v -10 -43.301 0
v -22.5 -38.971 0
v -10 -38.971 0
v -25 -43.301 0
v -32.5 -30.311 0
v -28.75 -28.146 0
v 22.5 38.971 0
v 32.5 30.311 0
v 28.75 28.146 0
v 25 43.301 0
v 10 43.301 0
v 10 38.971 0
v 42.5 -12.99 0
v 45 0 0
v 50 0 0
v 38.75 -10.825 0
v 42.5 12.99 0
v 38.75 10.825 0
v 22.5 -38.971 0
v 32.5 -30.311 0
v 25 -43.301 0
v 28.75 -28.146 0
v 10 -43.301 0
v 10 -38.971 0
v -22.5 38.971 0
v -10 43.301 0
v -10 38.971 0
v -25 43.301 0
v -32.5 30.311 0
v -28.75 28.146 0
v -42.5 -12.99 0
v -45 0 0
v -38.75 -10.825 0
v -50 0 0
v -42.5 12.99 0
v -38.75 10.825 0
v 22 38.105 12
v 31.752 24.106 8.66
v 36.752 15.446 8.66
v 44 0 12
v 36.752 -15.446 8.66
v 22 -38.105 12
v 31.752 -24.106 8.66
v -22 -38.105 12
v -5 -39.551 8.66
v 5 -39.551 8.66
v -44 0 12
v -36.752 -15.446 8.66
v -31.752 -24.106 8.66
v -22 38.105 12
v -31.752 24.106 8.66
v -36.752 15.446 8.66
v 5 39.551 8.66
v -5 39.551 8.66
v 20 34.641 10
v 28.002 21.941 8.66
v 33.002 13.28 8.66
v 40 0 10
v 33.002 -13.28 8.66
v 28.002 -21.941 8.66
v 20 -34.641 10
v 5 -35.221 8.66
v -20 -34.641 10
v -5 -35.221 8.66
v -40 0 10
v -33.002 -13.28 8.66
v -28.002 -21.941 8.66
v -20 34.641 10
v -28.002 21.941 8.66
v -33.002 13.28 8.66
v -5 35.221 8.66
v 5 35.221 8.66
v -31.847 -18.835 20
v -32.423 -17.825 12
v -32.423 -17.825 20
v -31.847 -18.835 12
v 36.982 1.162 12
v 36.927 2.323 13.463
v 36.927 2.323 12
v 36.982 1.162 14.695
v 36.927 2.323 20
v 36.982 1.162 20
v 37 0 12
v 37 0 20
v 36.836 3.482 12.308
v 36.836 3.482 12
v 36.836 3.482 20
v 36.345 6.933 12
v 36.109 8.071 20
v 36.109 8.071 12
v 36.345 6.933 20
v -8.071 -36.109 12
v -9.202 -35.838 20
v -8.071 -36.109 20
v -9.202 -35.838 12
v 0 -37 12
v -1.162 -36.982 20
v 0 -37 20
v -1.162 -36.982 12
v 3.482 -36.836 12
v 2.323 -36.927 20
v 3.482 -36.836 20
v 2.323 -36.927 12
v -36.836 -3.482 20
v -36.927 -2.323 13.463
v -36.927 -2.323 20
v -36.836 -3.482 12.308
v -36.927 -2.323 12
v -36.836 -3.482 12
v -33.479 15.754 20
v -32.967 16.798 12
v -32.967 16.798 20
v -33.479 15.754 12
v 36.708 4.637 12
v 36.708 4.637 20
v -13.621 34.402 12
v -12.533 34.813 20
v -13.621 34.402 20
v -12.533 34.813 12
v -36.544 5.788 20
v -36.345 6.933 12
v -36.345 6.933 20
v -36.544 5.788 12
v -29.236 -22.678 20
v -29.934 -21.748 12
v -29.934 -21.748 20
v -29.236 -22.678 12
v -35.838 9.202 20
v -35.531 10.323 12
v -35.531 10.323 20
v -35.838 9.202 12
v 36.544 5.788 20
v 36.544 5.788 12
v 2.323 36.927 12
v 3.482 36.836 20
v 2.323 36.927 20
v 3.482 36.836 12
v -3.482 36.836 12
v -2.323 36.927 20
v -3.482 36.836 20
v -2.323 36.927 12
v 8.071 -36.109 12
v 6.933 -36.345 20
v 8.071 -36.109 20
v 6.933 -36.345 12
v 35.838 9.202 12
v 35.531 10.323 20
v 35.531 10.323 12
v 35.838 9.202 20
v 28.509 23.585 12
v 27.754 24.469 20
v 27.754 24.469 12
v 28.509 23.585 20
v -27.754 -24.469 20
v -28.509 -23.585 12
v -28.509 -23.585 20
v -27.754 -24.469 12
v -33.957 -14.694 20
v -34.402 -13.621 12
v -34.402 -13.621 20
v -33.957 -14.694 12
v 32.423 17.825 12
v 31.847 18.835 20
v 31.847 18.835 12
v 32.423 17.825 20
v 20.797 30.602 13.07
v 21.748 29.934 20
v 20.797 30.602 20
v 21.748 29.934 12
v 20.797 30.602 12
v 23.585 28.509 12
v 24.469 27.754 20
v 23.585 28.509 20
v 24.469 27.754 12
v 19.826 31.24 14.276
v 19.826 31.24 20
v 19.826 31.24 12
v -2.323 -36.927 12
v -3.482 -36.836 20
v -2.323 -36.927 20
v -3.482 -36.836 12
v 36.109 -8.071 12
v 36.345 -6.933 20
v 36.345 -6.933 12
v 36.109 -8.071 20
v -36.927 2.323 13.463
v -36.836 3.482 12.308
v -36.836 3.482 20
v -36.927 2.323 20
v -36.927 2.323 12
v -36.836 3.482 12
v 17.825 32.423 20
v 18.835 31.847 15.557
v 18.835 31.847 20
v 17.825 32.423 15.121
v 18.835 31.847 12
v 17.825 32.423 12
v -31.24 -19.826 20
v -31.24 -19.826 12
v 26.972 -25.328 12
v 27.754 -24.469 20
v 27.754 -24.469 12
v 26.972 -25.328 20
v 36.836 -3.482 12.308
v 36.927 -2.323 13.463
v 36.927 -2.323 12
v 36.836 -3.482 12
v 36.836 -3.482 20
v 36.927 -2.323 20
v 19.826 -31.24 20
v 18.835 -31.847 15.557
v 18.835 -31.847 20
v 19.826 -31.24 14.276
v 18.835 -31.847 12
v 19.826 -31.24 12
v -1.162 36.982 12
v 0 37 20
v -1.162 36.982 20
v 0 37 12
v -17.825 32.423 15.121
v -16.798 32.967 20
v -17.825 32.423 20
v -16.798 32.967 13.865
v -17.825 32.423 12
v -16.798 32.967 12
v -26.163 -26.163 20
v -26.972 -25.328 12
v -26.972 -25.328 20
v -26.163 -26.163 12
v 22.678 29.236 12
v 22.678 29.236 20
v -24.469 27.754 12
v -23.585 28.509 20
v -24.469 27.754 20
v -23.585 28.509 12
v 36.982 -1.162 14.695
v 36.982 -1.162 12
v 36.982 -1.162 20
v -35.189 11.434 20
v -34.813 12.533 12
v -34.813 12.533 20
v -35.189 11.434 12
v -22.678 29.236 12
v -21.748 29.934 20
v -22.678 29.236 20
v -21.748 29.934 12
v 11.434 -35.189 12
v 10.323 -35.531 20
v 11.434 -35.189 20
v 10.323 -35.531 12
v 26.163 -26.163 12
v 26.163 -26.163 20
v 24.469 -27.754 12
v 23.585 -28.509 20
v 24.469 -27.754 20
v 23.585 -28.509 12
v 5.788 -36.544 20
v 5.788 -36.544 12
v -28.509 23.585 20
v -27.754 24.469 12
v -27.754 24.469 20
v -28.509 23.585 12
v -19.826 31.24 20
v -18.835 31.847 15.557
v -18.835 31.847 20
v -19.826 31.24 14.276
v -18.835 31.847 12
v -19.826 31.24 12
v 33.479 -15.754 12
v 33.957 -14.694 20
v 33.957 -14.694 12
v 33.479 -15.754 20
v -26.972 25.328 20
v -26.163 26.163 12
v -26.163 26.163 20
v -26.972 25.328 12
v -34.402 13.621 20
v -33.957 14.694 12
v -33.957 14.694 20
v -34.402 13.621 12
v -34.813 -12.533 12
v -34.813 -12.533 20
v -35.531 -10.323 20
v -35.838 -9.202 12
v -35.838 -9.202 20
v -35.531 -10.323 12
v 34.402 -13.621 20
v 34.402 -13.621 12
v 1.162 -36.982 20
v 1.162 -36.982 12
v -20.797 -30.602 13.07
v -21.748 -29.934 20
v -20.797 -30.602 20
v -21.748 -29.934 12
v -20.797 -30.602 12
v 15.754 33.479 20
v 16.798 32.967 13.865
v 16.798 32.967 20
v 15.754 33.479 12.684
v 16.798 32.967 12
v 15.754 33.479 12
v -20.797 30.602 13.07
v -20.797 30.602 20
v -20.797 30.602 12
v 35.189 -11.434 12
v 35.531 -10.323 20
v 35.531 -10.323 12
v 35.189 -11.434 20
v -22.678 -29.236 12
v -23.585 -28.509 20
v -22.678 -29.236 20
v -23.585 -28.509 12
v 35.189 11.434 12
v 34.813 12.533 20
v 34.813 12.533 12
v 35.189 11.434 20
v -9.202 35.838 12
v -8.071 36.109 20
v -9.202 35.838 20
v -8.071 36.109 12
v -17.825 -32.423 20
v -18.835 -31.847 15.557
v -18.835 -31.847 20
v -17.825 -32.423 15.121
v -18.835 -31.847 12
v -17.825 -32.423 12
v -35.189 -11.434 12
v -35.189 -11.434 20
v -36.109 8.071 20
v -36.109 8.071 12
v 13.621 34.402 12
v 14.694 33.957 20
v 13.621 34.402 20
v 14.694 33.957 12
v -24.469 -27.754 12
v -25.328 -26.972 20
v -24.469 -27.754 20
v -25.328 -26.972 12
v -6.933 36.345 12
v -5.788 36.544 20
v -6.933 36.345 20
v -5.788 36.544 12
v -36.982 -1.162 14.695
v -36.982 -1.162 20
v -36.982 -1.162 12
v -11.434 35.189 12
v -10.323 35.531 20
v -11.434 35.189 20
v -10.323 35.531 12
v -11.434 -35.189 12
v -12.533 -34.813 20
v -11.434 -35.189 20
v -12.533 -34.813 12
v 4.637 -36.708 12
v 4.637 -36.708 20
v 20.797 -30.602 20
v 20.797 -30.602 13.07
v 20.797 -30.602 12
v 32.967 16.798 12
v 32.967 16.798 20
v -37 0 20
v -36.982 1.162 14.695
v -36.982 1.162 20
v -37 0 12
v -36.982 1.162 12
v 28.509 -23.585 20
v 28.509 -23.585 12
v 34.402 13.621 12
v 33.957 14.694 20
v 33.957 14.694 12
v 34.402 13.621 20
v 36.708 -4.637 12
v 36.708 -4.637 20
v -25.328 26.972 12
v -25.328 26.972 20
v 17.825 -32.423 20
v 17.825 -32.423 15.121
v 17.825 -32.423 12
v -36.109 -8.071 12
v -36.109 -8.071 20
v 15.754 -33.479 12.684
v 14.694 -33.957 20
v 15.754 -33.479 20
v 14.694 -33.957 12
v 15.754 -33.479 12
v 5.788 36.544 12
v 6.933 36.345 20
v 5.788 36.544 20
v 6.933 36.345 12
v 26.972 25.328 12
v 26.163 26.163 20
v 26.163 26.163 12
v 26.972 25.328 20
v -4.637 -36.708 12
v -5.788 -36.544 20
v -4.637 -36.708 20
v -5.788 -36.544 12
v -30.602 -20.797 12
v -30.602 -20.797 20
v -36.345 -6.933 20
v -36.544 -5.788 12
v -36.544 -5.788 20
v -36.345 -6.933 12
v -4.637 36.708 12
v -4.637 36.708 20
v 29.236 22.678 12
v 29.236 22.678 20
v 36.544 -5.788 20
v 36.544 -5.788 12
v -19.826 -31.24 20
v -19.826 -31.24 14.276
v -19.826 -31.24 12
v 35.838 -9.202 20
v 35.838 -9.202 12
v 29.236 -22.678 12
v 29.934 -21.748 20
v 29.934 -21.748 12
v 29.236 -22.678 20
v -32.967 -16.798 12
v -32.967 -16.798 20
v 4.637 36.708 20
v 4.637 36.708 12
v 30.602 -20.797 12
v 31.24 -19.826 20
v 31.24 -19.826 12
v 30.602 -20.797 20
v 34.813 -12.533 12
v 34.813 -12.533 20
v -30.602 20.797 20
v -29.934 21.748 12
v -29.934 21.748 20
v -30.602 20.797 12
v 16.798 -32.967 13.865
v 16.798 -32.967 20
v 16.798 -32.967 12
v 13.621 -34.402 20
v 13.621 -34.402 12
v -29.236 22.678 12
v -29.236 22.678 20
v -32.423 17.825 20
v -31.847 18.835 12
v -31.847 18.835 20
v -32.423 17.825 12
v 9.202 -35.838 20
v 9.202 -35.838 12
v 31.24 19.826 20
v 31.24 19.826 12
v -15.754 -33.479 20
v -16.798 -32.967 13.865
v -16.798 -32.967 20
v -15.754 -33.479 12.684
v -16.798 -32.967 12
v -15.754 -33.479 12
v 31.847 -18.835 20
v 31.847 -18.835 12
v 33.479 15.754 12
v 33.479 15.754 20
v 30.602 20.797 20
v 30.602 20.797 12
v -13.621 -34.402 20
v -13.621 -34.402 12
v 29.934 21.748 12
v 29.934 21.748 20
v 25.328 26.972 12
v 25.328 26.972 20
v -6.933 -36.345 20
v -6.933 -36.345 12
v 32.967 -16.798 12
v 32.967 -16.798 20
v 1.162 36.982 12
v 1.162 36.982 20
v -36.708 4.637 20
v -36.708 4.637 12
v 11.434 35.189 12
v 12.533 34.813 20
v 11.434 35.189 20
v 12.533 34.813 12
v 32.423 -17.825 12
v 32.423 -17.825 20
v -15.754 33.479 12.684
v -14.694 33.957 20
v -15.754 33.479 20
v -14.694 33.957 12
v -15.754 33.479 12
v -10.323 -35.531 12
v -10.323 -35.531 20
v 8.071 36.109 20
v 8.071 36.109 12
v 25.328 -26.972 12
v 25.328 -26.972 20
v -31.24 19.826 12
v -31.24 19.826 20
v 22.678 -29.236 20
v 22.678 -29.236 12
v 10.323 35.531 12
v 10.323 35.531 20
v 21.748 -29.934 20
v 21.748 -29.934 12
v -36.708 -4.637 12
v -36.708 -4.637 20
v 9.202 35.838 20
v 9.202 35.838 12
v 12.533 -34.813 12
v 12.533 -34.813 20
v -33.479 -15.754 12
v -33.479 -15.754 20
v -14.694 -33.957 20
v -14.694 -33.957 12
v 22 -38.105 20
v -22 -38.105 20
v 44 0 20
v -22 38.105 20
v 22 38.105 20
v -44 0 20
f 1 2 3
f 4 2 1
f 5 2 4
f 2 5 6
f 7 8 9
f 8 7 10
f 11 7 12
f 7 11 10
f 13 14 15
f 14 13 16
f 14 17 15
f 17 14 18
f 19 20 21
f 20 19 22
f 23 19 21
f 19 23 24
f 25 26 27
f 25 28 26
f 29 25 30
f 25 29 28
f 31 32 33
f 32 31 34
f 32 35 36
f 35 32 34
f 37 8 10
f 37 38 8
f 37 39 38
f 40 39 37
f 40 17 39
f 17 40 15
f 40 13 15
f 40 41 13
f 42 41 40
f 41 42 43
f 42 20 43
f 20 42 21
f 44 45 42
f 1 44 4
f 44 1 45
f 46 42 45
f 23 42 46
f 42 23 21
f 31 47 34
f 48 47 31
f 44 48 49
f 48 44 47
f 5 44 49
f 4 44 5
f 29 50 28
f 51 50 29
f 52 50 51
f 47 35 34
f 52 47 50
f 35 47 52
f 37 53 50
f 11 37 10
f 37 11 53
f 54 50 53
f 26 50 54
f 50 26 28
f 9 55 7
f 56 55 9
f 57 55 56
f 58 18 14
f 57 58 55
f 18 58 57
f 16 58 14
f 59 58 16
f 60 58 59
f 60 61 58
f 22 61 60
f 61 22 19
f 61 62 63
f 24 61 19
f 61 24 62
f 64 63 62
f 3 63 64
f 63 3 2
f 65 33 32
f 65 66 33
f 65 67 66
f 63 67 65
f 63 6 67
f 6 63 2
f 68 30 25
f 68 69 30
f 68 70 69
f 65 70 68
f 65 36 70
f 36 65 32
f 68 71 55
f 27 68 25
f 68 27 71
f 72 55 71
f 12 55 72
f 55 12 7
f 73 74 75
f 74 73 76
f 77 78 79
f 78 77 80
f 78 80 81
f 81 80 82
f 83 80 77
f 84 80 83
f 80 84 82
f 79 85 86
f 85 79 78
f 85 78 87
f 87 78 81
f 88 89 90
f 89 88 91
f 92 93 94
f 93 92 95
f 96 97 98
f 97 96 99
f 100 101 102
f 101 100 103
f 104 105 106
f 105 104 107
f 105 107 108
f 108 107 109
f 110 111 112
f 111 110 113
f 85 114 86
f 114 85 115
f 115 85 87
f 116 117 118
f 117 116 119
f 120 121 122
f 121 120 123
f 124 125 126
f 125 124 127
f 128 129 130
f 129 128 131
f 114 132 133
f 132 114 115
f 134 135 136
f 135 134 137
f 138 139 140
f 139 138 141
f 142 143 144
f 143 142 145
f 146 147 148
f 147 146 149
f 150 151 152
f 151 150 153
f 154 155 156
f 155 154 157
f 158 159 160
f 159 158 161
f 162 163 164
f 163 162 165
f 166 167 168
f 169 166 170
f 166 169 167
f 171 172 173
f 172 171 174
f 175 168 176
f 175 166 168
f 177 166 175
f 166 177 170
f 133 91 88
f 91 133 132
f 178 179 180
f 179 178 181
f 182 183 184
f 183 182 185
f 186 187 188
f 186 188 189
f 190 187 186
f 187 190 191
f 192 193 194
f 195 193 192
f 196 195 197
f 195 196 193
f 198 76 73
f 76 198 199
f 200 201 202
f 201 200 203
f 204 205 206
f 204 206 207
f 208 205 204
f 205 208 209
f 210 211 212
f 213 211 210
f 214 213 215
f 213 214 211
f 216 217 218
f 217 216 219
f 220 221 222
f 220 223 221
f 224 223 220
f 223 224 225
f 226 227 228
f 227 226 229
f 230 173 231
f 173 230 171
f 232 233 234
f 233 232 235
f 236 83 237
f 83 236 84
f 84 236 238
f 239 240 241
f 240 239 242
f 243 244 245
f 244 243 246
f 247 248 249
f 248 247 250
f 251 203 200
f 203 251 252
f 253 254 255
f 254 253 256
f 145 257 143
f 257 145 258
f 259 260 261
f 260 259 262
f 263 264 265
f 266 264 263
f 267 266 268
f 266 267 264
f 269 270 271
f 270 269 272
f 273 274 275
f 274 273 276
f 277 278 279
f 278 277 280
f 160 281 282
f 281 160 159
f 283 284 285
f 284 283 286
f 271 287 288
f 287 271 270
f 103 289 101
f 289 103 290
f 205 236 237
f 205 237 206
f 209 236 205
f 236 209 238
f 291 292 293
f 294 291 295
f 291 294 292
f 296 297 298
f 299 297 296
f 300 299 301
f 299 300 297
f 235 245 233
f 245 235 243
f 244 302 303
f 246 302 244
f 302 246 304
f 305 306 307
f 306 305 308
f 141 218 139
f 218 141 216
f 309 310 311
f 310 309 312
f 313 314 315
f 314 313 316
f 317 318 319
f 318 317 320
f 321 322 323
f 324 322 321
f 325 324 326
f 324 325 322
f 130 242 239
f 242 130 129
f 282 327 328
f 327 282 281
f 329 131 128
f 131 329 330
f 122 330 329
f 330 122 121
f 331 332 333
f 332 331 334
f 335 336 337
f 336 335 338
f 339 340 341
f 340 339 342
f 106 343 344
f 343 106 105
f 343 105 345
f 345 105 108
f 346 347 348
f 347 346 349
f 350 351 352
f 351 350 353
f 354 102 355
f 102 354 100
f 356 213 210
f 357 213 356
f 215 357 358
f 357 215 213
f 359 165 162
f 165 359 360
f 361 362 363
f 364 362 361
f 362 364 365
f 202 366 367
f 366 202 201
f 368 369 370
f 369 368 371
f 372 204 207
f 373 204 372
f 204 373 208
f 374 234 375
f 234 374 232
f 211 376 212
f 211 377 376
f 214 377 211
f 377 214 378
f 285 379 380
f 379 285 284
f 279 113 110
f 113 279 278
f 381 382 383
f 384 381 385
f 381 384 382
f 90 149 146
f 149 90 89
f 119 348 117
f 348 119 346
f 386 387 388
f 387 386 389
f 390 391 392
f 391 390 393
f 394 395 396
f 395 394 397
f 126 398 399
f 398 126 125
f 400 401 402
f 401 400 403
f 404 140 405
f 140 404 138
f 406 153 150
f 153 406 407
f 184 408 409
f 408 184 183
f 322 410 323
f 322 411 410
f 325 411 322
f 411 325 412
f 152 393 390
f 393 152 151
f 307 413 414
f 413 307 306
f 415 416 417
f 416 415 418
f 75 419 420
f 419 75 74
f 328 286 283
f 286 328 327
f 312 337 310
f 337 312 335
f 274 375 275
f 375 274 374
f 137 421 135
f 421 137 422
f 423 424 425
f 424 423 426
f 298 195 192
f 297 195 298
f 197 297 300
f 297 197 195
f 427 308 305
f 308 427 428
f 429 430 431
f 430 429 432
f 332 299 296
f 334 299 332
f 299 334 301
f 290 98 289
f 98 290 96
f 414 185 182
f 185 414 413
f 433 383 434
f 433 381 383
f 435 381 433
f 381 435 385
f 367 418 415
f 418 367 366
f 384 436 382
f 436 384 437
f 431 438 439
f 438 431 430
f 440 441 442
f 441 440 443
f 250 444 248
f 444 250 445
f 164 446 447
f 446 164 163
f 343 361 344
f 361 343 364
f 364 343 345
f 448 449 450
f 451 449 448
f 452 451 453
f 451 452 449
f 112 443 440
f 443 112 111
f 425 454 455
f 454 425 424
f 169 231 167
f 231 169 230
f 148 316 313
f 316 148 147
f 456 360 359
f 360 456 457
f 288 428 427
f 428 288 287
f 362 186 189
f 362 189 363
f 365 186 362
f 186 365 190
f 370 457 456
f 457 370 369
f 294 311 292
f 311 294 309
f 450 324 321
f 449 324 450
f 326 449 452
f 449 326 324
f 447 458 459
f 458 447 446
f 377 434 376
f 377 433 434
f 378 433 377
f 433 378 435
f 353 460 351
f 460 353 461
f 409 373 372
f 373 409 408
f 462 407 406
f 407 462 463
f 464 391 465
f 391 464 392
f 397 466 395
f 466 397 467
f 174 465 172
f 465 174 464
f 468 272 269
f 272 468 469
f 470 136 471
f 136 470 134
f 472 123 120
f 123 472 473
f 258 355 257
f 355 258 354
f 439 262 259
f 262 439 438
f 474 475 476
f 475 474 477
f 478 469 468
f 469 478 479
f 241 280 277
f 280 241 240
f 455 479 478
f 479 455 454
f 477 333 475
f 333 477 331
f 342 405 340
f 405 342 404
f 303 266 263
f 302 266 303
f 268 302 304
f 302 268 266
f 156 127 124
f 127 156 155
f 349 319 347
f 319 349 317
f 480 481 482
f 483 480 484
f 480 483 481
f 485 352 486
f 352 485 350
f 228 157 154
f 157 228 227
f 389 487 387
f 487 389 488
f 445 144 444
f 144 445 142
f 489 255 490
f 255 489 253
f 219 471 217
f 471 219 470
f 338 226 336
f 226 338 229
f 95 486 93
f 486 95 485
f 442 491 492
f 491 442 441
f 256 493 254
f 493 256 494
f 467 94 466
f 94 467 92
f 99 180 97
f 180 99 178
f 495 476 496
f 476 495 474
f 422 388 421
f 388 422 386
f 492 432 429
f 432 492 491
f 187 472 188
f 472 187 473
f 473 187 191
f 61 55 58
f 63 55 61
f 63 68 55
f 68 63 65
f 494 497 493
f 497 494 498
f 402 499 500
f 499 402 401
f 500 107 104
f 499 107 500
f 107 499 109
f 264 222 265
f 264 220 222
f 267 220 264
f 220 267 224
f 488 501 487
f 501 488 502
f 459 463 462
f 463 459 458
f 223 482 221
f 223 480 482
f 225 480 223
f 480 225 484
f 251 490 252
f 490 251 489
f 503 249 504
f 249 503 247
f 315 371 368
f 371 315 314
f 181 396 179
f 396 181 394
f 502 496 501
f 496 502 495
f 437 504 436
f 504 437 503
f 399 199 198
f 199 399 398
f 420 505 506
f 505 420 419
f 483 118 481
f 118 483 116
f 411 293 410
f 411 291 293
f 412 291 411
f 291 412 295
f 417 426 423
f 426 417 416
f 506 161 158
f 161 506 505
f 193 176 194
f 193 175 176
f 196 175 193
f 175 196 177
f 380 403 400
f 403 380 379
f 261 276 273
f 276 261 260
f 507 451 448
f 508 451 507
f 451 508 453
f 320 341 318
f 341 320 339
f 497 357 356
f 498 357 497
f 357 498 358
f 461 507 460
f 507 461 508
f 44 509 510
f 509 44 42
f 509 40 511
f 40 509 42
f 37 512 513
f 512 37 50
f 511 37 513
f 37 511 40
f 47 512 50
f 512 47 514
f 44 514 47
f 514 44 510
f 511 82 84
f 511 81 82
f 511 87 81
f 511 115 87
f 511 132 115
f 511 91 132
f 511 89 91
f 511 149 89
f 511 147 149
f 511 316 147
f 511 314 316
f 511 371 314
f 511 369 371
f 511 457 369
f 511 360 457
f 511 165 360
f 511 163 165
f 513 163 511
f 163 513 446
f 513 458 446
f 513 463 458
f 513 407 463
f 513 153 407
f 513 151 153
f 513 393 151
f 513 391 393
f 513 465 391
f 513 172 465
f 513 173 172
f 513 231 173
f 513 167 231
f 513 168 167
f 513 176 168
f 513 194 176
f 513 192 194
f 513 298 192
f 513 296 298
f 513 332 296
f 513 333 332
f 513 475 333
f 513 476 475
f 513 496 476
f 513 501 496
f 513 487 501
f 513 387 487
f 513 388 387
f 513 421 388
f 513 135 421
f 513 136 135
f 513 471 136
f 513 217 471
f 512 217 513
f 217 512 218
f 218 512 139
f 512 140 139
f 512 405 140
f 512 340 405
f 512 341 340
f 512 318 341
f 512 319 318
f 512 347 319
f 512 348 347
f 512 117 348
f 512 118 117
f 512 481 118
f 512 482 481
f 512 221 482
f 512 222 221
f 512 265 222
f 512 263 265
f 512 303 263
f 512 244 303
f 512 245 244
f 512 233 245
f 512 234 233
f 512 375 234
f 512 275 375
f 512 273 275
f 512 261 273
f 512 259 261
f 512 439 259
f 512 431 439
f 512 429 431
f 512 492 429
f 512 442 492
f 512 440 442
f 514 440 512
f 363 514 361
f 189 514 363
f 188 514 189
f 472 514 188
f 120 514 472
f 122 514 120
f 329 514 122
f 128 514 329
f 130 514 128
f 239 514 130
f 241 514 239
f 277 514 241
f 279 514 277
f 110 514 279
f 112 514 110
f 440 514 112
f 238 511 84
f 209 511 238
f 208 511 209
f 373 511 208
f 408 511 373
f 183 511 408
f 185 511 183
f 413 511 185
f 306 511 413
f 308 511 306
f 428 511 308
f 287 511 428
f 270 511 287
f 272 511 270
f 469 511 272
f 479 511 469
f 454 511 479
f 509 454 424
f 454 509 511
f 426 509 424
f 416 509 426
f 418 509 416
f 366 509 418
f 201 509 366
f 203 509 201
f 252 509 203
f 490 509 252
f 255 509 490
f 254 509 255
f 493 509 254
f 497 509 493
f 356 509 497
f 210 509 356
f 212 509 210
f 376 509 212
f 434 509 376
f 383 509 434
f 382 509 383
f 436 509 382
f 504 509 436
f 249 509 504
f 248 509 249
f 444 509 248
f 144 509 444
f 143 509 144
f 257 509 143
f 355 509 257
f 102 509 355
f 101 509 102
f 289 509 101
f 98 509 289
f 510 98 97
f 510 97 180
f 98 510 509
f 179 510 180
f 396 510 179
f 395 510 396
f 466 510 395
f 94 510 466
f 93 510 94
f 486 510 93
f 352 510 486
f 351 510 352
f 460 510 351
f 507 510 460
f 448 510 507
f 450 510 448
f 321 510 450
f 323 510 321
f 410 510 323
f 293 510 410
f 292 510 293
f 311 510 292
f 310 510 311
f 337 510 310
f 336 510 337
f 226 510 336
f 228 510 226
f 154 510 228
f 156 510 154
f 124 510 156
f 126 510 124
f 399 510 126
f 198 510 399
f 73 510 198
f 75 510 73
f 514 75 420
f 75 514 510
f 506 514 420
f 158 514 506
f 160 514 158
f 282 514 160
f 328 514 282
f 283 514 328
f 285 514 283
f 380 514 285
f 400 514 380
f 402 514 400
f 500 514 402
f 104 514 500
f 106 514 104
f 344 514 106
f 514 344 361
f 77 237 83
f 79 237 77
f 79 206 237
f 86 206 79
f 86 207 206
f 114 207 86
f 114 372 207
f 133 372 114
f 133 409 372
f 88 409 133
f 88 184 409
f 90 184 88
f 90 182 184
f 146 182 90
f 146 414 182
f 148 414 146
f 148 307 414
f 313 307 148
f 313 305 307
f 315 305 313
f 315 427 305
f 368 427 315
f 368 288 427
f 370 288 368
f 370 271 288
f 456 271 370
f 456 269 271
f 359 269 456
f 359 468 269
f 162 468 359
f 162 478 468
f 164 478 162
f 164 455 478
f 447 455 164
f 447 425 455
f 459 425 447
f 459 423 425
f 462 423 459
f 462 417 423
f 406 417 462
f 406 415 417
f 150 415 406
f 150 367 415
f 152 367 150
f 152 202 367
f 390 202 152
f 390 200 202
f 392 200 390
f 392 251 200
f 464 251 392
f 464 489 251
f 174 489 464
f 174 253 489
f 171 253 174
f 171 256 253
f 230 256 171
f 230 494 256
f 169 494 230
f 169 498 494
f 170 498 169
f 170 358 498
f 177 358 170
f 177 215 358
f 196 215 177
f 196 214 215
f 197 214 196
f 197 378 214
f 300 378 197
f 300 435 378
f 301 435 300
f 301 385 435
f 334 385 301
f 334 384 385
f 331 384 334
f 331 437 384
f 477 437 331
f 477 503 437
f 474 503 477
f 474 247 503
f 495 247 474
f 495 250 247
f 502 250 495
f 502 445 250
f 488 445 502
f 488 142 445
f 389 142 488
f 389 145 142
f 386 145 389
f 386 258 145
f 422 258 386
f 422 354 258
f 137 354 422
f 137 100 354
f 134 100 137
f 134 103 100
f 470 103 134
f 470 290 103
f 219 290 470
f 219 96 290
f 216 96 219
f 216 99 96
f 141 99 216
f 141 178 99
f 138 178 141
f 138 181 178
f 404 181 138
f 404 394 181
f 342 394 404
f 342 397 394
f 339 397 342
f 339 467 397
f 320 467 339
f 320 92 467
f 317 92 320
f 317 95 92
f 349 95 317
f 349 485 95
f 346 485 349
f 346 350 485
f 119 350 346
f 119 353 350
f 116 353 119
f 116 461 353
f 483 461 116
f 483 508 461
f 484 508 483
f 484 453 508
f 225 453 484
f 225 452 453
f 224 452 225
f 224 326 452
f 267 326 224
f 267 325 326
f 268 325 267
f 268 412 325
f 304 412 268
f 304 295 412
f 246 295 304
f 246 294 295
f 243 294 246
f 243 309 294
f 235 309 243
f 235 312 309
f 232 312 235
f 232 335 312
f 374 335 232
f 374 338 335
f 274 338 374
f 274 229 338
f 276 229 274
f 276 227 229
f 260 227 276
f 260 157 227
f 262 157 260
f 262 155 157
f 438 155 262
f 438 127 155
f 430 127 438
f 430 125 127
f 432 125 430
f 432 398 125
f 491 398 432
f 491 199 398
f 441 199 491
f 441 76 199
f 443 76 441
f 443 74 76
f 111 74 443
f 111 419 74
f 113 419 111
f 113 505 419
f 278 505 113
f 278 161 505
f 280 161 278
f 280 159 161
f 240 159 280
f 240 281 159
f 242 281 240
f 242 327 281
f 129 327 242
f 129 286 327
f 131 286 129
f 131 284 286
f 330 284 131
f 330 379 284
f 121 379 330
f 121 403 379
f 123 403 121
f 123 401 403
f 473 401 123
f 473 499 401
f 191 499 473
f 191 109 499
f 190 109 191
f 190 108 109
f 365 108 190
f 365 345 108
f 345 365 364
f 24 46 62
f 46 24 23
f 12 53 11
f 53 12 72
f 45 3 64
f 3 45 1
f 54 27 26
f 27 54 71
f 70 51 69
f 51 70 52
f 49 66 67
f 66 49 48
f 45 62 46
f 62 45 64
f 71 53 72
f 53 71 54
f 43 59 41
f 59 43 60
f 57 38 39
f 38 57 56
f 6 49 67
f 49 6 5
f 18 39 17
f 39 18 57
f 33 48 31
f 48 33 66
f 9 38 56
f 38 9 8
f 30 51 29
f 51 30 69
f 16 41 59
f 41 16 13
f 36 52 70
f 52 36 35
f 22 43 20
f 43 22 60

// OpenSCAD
module my_cone() {
  linear_extrude(height=100,scale=0) circle(d=100,$fn=6);
}

rotate([0,0,0]) {
  difference() {
    union() {
      difference() {
        difference() {
          my_cone();
          translate([0,0,-10]) my_cone();
        }
        translate([0,0,10]) cylinder(h=9999,d=74,$fn=200);
        translate([0,0,16]) cylinder(h=9999,d=9999);
      }
      translate([0,0,10]) difference() {
        cylinder(h=10,d=88,$fn=6);
        translate([0,0,2]) cylinder(h=9999,d=74,$fn=200);
      }
    }
    for(i=[0,120,240]) {
      rotate([0,90,0]) rotate([0,90+i,90]) {
        cylinder(d=20,h=9999,center=true,$fn=6);
      }
    }
  }
}
